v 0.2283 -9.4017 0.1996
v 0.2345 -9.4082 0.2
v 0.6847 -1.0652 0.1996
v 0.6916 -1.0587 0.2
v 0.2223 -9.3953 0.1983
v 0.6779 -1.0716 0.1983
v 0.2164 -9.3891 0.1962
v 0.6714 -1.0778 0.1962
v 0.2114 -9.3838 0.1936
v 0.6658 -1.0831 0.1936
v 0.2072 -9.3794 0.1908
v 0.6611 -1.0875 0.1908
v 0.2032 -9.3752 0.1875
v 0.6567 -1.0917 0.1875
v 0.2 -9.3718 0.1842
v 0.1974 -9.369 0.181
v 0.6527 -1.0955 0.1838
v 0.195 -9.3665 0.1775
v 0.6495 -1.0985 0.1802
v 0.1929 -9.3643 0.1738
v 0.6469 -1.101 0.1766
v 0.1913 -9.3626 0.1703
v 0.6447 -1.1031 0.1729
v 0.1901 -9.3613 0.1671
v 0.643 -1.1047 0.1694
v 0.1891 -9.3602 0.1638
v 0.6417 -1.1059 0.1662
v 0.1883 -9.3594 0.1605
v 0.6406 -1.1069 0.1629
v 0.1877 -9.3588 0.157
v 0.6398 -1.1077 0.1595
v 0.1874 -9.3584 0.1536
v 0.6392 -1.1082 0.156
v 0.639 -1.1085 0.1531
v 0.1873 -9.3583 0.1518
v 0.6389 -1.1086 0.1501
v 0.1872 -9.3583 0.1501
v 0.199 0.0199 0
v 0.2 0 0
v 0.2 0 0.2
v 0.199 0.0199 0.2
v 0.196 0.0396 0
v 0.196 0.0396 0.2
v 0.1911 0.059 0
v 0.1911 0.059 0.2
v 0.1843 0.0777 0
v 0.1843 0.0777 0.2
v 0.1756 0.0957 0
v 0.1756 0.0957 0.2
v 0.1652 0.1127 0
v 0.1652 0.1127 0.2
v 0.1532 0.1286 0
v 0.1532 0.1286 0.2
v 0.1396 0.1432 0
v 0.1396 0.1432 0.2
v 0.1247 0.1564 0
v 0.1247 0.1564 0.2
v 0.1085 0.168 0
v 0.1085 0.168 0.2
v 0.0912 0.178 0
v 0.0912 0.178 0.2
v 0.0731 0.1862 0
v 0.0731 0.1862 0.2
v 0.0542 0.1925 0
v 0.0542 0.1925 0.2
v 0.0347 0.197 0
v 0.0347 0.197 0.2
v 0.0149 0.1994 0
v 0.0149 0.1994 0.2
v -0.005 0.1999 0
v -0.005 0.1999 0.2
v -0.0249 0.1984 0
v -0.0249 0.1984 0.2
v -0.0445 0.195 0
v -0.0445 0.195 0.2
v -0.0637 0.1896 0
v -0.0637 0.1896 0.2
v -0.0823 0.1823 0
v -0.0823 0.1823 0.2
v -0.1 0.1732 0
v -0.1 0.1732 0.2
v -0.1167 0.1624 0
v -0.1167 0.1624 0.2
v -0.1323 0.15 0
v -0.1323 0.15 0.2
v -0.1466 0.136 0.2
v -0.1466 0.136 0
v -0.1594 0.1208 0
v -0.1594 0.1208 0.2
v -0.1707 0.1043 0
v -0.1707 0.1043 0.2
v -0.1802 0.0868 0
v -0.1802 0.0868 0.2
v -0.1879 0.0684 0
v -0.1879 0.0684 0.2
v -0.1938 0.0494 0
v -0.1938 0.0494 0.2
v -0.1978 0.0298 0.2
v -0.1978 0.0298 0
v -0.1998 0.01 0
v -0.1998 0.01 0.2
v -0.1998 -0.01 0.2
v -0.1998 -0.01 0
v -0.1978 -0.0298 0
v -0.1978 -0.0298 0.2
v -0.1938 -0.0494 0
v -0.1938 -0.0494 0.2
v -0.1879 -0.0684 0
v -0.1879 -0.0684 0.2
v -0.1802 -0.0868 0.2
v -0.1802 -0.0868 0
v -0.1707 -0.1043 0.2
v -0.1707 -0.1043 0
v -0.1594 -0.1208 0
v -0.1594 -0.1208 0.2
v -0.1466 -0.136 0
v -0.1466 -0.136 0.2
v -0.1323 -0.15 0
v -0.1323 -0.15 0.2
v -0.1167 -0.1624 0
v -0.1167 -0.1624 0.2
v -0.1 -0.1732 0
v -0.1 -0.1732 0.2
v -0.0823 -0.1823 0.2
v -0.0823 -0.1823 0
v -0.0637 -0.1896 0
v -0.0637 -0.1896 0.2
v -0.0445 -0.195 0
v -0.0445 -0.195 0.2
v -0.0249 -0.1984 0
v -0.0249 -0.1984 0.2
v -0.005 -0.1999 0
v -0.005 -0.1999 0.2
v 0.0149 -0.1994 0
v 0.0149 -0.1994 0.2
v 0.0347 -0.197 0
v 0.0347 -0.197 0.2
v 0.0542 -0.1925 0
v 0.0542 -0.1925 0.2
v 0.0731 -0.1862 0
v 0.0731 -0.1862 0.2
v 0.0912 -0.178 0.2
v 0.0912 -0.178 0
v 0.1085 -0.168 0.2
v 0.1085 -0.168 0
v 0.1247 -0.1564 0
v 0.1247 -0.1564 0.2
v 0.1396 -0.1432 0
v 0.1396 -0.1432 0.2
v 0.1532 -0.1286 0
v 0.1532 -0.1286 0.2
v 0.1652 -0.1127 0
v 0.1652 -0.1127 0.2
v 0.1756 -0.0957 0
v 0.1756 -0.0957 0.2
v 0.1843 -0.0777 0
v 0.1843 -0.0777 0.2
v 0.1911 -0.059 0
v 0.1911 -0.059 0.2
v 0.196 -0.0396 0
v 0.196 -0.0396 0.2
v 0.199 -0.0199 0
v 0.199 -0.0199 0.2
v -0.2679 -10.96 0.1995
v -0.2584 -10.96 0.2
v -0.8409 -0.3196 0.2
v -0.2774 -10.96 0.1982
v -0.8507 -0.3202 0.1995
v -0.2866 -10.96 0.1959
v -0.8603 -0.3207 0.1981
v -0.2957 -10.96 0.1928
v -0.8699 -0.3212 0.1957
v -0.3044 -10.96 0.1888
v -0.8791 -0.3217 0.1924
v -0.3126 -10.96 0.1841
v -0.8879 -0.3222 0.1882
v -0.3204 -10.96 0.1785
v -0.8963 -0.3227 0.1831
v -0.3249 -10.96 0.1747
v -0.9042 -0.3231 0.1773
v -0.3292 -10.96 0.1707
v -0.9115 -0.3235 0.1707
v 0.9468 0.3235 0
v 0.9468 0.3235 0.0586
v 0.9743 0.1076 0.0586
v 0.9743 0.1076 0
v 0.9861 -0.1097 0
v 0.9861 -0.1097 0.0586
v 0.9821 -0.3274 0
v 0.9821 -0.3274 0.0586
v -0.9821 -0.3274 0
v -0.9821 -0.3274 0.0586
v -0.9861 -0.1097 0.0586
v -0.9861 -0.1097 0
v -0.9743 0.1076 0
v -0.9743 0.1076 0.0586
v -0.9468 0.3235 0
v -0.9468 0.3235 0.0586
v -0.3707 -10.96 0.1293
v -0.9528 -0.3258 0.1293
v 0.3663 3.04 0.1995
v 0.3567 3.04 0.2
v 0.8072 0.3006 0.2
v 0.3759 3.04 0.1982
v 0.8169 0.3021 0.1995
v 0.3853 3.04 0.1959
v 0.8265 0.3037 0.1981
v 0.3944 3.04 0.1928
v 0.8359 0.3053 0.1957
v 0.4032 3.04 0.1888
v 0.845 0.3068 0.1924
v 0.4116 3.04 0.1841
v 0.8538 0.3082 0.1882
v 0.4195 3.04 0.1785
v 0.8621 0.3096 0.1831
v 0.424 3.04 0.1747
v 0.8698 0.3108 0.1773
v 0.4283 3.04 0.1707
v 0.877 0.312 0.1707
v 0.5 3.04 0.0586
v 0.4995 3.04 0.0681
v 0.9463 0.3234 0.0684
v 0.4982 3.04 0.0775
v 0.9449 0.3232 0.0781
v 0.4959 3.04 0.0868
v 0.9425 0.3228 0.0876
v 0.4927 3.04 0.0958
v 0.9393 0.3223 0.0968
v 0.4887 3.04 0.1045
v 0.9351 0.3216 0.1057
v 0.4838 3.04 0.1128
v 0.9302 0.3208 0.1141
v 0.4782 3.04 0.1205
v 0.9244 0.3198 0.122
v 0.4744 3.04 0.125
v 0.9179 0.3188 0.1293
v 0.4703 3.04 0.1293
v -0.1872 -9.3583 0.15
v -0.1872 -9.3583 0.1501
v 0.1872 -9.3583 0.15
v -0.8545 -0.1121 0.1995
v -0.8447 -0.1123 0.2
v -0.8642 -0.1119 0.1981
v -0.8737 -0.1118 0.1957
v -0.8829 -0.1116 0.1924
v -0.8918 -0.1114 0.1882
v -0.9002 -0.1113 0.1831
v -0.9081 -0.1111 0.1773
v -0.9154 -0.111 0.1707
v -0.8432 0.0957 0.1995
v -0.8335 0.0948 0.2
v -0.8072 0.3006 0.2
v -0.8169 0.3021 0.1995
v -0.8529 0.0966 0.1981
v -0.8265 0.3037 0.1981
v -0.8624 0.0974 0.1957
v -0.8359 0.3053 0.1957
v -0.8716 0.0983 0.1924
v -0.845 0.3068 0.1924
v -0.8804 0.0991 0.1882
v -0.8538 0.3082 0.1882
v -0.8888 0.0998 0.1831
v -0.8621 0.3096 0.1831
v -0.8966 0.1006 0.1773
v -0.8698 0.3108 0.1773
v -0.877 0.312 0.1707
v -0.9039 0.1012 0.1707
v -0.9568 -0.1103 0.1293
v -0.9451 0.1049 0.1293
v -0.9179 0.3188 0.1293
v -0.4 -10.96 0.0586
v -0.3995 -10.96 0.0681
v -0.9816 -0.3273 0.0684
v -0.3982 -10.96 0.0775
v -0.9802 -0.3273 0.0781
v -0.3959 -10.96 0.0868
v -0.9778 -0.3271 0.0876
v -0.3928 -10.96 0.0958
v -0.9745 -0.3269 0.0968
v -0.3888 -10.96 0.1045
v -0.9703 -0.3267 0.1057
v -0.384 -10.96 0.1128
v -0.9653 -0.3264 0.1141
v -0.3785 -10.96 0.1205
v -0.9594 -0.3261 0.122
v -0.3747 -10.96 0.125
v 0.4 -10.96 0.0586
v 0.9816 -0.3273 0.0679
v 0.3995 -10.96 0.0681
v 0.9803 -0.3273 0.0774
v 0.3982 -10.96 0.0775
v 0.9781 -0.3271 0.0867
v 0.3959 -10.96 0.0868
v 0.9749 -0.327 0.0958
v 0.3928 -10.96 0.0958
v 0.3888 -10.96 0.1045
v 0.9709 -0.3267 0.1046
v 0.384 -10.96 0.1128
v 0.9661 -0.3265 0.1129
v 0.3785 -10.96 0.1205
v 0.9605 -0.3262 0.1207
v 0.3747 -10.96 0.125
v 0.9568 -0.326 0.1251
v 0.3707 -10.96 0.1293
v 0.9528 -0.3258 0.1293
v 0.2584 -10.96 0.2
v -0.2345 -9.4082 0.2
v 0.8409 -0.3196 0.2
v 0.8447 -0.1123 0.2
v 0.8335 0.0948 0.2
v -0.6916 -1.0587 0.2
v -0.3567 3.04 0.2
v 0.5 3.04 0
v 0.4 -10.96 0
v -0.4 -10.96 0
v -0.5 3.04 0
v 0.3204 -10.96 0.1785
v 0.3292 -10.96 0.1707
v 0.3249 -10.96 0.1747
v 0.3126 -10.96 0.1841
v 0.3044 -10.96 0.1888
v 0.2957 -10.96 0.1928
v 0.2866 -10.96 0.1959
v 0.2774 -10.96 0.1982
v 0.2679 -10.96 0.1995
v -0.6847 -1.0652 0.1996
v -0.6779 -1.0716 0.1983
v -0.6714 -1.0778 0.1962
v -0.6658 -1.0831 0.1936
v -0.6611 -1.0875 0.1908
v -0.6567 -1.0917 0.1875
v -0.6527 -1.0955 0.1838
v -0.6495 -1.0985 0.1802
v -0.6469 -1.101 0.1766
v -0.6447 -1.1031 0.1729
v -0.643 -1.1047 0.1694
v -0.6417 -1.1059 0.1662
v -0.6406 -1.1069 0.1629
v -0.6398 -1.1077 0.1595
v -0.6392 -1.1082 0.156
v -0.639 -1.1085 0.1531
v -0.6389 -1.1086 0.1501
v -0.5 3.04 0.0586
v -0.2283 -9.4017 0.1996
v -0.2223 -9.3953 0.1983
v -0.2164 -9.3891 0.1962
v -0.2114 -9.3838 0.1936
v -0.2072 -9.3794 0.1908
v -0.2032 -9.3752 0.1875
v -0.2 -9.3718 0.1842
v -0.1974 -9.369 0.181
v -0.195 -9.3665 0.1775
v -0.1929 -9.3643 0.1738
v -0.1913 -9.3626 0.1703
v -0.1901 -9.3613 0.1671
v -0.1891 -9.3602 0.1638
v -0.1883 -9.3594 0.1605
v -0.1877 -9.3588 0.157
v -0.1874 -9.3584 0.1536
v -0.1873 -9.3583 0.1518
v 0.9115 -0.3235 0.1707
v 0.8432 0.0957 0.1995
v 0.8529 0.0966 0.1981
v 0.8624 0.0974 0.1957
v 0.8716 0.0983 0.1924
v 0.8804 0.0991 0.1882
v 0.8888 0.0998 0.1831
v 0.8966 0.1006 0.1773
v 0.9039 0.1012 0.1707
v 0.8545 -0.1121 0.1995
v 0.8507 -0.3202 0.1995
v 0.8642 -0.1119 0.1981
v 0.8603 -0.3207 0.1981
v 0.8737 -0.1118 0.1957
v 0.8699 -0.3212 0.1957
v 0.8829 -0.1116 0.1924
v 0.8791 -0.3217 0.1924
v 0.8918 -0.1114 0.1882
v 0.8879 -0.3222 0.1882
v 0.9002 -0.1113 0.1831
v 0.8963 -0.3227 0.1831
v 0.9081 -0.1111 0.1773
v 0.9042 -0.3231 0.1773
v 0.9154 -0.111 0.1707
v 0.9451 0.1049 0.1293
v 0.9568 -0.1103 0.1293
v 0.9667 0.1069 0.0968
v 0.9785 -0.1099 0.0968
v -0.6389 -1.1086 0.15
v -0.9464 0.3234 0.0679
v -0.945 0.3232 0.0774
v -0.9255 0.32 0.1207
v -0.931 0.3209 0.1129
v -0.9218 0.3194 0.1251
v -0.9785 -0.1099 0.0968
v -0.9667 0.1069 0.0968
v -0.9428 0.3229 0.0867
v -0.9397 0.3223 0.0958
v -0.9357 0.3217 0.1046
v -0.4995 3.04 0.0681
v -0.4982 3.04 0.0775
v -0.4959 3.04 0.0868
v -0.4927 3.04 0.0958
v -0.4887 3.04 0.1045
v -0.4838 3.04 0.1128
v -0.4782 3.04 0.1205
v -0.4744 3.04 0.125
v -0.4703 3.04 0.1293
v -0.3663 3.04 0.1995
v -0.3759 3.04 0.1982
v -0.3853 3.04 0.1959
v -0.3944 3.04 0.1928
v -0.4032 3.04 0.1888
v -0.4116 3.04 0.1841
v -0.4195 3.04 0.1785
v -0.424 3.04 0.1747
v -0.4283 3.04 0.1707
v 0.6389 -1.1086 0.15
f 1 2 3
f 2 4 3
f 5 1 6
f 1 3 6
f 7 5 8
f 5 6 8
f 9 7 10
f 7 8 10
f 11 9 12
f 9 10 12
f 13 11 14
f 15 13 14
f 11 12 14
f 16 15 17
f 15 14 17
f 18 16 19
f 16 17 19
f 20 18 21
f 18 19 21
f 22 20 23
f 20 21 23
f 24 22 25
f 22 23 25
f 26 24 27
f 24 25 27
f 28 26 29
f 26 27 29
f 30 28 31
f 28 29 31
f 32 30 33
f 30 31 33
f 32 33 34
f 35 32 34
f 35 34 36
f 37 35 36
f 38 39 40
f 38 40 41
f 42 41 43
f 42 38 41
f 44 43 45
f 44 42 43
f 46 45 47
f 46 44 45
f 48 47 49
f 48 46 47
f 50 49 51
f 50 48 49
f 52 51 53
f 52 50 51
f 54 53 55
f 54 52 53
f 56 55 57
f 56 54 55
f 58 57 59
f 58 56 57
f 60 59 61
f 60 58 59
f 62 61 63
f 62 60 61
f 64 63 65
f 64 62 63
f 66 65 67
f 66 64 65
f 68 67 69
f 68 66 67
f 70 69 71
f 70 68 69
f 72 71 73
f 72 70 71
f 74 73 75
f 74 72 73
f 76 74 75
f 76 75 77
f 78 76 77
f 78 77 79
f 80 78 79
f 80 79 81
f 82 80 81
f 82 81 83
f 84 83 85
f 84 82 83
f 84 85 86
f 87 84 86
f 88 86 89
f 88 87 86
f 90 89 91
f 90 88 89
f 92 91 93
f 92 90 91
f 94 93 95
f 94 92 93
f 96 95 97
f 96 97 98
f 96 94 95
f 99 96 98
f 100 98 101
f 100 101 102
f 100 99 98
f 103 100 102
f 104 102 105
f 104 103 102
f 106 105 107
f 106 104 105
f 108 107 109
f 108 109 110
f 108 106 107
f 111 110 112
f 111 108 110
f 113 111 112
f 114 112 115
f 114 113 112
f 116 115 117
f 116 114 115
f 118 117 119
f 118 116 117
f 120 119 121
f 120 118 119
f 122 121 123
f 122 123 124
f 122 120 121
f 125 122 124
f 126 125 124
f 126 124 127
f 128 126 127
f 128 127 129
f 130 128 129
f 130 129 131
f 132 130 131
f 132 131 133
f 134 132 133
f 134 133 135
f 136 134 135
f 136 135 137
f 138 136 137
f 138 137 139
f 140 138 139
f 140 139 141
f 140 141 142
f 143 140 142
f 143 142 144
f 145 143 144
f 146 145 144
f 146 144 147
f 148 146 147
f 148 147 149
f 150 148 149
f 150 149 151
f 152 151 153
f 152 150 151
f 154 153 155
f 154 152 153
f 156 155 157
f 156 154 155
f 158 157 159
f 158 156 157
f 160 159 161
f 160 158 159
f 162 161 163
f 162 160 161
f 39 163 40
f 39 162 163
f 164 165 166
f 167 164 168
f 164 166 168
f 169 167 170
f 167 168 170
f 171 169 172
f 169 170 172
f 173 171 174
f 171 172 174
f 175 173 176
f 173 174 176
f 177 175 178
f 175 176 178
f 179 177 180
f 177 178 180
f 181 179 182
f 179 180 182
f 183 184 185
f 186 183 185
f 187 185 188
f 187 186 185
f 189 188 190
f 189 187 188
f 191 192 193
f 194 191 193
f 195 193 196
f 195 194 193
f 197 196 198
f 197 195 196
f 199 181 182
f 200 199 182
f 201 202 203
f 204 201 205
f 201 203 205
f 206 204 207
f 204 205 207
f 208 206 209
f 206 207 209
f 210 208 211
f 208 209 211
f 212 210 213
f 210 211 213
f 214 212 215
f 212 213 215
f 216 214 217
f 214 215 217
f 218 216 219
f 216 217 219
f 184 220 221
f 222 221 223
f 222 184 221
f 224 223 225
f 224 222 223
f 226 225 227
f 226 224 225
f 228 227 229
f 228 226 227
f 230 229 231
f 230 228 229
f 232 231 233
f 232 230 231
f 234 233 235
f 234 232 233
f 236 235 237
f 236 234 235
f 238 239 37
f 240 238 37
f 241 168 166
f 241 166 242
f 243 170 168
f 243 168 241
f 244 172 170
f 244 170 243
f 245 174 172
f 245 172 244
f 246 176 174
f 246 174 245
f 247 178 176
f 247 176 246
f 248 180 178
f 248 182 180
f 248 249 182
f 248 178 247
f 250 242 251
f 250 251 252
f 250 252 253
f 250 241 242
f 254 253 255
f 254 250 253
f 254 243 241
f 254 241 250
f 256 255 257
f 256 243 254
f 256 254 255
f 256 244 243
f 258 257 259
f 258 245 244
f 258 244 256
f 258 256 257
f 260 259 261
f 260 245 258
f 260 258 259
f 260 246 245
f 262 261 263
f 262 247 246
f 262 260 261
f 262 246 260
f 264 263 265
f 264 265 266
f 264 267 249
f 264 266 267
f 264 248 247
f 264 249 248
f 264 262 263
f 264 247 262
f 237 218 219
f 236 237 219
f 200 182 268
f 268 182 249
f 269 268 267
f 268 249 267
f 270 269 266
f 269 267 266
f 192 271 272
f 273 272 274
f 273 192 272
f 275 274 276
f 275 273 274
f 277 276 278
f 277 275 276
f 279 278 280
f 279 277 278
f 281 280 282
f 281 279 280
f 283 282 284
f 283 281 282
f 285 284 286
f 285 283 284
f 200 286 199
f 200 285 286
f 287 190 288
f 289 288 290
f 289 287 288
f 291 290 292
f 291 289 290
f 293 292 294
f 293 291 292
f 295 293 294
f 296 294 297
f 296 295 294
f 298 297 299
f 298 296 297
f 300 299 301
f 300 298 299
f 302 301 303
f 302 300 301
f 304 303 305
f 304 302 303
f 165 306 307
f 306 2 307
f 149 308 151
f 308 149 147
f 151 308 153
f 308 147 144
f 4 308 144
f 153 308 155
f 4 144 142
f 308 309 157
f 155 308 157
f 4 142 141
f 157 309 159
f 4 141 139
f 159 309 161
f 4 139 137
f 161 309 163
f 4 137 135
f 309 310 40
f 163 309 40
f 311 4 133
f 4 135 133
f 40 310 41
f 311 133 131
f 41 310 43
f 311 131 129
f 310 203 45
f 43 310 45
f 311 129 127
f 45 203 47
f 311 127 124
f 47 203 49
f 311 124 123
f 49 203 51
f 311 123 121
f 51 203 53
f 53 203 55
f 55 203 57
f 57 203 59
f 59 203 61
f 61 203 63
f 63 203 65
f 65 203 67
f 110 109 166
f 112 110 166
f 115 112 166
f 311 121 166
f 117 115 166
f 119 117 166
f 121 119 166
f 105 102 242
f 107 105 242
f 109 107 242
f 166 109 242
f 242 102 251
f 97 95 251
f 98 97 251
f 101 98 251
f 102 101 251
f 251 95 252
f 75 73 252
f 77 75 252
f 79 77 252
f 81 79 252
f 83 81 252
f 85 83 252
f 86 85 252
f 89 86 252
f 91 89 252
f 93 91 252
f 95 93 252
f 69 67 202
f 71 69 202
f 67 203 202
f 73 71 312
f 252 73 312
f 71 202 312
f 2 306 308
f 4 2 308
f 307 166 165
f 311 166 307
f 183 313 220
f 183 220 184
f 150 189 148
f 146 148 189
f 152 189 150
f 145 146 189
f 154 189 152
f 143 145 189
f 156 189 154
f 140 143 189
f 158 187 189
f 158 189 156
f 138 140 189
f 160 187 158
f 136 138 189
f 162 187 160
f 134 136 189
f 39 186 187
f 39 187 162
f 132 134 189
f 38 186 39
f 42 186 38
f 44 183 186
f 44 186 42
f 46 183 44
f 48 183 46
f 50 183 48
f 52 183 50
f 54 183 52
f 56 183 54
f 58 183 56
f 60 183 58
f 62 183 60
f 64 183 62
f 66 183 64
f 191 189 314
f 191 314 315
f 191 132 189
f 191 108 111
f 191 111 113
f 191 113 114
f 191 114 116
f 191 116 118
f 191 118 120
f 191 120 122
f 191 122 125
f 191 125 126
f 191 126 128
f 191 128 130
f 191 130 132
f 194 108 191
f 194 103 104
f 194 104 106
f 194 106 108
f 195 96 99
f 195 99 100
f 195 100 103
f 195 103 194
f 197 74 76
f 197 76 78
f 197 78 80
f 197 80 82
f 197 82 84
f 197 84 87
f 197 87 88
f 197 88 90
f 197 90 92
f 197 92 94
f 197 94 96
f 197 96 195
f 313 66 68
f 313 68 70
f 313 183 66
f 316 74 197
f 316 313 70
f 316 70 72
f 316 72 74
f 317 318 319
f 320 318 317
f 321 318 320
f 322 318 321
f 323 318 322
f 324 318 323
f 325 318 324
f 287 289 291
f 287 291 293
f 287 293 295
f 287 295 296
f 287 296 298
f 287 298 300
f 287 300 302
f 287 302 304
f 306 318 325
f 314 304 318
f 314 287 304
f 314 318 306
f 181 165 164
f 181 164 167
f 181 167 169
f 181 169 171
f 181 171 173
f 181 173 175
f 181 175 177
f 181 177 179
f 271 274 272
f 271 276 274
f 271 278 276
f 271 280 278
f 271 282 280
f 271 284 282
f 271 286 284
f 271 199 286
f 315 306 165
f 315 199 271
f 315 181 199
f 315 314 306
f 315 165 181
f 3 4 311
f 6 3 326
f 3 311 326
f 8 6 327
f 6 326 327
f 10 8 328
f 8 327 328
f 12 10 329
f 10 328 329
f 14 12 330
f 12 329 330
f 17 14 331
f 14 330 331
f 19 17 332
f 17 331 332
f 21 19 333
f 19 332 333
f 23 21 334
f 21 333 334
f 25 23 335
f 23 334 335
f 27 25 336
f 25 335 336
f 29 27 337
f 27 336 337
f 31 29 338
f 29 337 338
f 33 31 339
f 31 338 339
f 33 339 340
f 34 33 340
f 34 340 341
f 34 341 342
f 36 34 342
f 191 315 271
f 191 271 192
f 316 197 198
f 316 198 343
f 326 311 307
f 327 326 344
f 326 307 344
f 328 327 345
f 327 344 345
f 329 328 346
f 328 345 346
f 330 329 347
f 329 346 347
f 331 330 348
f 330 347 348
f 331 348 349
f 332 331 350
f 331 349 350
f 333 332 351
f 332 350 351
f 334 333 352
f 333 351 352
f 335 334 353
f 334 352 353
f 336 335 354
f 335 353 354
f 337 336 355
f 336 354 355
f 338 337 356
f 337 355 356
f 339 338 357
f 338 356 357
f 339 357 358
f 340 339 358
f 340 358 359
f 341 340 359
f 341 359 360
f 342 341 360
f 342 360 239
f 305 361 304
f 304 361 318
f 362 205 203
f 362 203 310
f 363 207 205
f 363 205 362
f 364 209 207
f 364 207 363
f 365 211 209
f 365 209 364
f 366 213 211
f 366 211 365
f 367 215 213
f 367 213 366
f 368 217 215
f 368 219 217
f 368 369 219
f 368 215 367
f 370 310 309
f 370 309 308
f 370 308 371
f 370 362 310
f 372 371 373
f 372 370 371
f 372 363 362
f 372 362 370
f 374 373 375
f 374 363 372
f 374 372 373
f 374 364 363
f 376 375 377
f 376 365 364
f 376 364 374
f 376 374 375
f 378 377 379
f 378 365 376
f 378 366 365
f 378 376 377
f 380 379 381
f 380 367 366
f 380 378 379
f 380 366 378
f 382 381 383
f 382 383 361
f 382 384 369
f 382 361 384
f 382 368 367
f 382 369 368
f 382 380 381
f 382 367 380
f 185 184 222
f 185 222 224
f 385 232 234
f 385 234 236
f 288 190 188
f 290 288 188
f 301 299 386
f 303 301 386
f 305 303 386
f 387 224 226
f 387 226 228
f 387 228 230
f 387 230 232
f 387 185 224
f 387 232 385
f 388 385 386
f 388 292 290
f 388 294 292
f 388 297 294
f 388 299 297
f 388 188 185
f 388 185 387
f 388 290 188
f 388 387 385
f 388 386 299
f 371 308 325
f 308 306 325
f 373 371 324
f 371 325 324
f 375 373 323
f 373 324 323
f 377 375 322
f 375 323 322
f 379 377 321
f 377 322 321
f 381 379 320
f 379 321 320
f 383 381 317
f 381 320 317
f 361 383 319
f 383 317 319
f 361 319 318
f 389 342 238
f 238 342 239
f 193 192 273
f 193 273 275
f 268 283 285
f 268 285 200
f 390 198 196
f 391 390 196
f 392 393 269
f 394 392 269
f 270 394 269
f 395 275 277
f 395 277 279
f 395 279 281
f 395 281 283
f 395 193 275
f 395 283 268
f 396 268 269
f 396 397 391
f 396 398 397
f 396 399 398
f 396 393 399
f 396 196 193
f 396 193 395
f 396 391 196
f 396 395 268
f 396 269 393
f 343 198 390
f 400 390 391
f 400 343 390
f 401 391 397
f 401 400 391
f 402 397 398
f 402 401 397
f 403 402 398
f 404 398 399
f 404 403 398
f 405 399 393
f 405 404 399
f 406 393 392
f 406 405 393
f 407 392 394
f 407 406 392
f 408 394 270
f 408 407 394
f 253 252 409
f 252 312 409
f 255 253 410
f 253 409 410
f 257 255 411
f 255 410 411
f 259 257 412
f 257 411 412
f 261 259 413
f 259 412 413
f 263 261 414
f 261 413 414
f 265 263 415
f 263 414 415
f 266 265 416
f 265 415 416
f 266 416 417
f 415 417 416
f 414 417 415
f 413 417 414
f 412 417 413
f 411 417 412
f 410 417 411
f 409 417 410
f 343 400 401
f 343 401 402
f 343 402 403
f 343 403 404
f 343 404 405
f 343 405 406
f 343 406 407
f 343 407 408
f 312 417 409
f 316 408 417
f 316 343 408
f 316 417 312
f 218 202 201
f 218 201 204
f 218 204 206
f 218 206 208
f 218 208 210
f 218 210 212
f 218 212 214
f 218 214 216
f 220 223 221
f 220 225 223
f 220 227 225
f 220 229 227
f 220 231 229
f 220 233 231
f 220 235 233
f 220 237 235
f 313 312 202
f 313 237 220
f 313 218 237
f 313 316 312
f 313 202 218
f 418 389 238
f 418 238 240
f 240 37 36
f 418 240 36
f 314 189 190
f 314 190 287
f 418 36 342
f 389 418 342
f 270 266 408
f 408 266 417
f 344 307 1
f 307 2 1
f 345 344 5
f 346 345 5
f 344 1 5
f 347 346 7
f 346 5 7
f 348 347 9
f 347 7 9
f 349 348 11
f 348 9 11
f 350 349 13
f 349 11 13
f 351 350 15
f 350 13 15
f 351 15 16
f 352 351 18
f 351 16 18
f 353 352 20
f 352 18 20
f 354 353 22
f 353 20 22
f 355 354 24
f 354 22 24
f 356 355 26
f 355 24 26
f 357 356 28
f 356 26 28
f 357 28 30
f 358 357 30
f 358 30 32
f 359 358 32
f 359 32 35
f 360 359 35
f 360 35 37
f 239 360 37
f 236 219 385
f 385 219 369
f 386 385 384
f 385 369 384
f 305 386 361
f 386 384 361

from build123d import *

# Parameters (mm, degrees)
SKETCH_1_R          = 0.2
EXTRUDE_1_DEPTH     = 0.2
CHAMFER_1_SIZE      = 0.1
CUT_EXTRUDE_1_DEPTH = 0.05
FILLET_1_R          = 0.1
FILLET_2_R          = 0.05


with BuildPart() as part:
    # Эскиз1 → Бобышка-Вытянуть1 (new body)
    with BuildSketch(Plane.XY):
        with BuildLine():
            Line((-0.946791834, 0.323505648), (-0.5, 3.04))
            Line((-0.5, 3.04), (0.5, 3.04))
            Line((0.5, 3.04), (0.946791834, 0.323505648))
            ThreePointArc((0.946791834, 0.323505648), (0.982164861, -0.000966935), (0.982078726, -0.327361942))
            Line((0.982078726, -0.327361942), (0.4, -10.96))
            Line((0.4, -10.96), (-0.4, -10.96))
            Line((-0.4, -10.96), (-0.982078726, -0.327361942))
            ThreePointArc((-0.982078726, -0.327361942), (-0.982164861, -0.000966935), (-0.946791834, 0.323505648))
        make_face()
        Circle(SKETCH_1_R, mode=Mode.SUBTRACT)
    extrude(amount=EXTRUDE_1_DEPTH)

    # Фаска1
    chamfer_1_edges = [part.edges().sort_by_distance(p)[0] for p in [
        (0.723395917, 1.681752824, 0.2),
        (-0.723395917, 1.681752824, 0.2),
        (-0.982164861, -0.000966935, 0.2),
        (-0.691039363, -5.643680971, 0.2),
        (0.691039363, -5.643680971, 0.2),
        (0.982164861, -0.000966935, 0.2),
    ]]
    chamfer(chamfer_1_edges, length=CHAMFER_1_SIZE)

    # Эскиз2 → Вырез-Вытянуть1 (cut)
    with BuildSketch(Plane.XY.offset(0.2)):
        Polygon((-0.638861233, -1.108595936), (-0.187234527, -9.358310432), (0.187234527, -9.358310432), (0.638861233, -1.108595936), align=None)
    extrude(amount=-CUT_EXTRUDE_1_DEPTH, mode=Mode.SUBTRACT)

    # Скругление1
    fillet_1_edges = [part.edges().sort_by_distance(p)[0] for p in [
        (-0.591039251, -5.640947837, 0.2),
        (-0.882311502, -0.006380501, 0.2),
        (-0.623387011, 1.673638165, 0.2),
        (0.623387011, 1.673638165, 0.2),
        (0.882311502, -0.006380501, 0.2),
        (0.591039251, -5.640947837, 0.2),
        (0.691039363, -5.643680971, 0.1),
        (0.982164861, -0.000966935, 0.1),
        (0.723395917, 1.681752824, 0.1),
        (-0.723395917, 1.681752824, 0.1),
        (-0.982164861, -0.000966935, 0.1),
        (-0.691039363, -5.643680971, 0.1),
    ]]
    fillet(fillet_1_edges, radius=FILLET_1_R)

    # Скругление2
    fillet_2_edges = [part.edges().sort_by_distance(p)[0] for p in [
        (0, -9.358310432, 0.2),
        (-0.41304788, -5.233453184, 0.2),
        (0.41304788, -5.233453184, 0.2),
        (0, -1.108595936, 0.2),
    ]]
    fillet(fillet_2_edges, radius=FILLET_2_R - 0.0001)  # a hair under: the kernel refuses the full size


solid = part.part
